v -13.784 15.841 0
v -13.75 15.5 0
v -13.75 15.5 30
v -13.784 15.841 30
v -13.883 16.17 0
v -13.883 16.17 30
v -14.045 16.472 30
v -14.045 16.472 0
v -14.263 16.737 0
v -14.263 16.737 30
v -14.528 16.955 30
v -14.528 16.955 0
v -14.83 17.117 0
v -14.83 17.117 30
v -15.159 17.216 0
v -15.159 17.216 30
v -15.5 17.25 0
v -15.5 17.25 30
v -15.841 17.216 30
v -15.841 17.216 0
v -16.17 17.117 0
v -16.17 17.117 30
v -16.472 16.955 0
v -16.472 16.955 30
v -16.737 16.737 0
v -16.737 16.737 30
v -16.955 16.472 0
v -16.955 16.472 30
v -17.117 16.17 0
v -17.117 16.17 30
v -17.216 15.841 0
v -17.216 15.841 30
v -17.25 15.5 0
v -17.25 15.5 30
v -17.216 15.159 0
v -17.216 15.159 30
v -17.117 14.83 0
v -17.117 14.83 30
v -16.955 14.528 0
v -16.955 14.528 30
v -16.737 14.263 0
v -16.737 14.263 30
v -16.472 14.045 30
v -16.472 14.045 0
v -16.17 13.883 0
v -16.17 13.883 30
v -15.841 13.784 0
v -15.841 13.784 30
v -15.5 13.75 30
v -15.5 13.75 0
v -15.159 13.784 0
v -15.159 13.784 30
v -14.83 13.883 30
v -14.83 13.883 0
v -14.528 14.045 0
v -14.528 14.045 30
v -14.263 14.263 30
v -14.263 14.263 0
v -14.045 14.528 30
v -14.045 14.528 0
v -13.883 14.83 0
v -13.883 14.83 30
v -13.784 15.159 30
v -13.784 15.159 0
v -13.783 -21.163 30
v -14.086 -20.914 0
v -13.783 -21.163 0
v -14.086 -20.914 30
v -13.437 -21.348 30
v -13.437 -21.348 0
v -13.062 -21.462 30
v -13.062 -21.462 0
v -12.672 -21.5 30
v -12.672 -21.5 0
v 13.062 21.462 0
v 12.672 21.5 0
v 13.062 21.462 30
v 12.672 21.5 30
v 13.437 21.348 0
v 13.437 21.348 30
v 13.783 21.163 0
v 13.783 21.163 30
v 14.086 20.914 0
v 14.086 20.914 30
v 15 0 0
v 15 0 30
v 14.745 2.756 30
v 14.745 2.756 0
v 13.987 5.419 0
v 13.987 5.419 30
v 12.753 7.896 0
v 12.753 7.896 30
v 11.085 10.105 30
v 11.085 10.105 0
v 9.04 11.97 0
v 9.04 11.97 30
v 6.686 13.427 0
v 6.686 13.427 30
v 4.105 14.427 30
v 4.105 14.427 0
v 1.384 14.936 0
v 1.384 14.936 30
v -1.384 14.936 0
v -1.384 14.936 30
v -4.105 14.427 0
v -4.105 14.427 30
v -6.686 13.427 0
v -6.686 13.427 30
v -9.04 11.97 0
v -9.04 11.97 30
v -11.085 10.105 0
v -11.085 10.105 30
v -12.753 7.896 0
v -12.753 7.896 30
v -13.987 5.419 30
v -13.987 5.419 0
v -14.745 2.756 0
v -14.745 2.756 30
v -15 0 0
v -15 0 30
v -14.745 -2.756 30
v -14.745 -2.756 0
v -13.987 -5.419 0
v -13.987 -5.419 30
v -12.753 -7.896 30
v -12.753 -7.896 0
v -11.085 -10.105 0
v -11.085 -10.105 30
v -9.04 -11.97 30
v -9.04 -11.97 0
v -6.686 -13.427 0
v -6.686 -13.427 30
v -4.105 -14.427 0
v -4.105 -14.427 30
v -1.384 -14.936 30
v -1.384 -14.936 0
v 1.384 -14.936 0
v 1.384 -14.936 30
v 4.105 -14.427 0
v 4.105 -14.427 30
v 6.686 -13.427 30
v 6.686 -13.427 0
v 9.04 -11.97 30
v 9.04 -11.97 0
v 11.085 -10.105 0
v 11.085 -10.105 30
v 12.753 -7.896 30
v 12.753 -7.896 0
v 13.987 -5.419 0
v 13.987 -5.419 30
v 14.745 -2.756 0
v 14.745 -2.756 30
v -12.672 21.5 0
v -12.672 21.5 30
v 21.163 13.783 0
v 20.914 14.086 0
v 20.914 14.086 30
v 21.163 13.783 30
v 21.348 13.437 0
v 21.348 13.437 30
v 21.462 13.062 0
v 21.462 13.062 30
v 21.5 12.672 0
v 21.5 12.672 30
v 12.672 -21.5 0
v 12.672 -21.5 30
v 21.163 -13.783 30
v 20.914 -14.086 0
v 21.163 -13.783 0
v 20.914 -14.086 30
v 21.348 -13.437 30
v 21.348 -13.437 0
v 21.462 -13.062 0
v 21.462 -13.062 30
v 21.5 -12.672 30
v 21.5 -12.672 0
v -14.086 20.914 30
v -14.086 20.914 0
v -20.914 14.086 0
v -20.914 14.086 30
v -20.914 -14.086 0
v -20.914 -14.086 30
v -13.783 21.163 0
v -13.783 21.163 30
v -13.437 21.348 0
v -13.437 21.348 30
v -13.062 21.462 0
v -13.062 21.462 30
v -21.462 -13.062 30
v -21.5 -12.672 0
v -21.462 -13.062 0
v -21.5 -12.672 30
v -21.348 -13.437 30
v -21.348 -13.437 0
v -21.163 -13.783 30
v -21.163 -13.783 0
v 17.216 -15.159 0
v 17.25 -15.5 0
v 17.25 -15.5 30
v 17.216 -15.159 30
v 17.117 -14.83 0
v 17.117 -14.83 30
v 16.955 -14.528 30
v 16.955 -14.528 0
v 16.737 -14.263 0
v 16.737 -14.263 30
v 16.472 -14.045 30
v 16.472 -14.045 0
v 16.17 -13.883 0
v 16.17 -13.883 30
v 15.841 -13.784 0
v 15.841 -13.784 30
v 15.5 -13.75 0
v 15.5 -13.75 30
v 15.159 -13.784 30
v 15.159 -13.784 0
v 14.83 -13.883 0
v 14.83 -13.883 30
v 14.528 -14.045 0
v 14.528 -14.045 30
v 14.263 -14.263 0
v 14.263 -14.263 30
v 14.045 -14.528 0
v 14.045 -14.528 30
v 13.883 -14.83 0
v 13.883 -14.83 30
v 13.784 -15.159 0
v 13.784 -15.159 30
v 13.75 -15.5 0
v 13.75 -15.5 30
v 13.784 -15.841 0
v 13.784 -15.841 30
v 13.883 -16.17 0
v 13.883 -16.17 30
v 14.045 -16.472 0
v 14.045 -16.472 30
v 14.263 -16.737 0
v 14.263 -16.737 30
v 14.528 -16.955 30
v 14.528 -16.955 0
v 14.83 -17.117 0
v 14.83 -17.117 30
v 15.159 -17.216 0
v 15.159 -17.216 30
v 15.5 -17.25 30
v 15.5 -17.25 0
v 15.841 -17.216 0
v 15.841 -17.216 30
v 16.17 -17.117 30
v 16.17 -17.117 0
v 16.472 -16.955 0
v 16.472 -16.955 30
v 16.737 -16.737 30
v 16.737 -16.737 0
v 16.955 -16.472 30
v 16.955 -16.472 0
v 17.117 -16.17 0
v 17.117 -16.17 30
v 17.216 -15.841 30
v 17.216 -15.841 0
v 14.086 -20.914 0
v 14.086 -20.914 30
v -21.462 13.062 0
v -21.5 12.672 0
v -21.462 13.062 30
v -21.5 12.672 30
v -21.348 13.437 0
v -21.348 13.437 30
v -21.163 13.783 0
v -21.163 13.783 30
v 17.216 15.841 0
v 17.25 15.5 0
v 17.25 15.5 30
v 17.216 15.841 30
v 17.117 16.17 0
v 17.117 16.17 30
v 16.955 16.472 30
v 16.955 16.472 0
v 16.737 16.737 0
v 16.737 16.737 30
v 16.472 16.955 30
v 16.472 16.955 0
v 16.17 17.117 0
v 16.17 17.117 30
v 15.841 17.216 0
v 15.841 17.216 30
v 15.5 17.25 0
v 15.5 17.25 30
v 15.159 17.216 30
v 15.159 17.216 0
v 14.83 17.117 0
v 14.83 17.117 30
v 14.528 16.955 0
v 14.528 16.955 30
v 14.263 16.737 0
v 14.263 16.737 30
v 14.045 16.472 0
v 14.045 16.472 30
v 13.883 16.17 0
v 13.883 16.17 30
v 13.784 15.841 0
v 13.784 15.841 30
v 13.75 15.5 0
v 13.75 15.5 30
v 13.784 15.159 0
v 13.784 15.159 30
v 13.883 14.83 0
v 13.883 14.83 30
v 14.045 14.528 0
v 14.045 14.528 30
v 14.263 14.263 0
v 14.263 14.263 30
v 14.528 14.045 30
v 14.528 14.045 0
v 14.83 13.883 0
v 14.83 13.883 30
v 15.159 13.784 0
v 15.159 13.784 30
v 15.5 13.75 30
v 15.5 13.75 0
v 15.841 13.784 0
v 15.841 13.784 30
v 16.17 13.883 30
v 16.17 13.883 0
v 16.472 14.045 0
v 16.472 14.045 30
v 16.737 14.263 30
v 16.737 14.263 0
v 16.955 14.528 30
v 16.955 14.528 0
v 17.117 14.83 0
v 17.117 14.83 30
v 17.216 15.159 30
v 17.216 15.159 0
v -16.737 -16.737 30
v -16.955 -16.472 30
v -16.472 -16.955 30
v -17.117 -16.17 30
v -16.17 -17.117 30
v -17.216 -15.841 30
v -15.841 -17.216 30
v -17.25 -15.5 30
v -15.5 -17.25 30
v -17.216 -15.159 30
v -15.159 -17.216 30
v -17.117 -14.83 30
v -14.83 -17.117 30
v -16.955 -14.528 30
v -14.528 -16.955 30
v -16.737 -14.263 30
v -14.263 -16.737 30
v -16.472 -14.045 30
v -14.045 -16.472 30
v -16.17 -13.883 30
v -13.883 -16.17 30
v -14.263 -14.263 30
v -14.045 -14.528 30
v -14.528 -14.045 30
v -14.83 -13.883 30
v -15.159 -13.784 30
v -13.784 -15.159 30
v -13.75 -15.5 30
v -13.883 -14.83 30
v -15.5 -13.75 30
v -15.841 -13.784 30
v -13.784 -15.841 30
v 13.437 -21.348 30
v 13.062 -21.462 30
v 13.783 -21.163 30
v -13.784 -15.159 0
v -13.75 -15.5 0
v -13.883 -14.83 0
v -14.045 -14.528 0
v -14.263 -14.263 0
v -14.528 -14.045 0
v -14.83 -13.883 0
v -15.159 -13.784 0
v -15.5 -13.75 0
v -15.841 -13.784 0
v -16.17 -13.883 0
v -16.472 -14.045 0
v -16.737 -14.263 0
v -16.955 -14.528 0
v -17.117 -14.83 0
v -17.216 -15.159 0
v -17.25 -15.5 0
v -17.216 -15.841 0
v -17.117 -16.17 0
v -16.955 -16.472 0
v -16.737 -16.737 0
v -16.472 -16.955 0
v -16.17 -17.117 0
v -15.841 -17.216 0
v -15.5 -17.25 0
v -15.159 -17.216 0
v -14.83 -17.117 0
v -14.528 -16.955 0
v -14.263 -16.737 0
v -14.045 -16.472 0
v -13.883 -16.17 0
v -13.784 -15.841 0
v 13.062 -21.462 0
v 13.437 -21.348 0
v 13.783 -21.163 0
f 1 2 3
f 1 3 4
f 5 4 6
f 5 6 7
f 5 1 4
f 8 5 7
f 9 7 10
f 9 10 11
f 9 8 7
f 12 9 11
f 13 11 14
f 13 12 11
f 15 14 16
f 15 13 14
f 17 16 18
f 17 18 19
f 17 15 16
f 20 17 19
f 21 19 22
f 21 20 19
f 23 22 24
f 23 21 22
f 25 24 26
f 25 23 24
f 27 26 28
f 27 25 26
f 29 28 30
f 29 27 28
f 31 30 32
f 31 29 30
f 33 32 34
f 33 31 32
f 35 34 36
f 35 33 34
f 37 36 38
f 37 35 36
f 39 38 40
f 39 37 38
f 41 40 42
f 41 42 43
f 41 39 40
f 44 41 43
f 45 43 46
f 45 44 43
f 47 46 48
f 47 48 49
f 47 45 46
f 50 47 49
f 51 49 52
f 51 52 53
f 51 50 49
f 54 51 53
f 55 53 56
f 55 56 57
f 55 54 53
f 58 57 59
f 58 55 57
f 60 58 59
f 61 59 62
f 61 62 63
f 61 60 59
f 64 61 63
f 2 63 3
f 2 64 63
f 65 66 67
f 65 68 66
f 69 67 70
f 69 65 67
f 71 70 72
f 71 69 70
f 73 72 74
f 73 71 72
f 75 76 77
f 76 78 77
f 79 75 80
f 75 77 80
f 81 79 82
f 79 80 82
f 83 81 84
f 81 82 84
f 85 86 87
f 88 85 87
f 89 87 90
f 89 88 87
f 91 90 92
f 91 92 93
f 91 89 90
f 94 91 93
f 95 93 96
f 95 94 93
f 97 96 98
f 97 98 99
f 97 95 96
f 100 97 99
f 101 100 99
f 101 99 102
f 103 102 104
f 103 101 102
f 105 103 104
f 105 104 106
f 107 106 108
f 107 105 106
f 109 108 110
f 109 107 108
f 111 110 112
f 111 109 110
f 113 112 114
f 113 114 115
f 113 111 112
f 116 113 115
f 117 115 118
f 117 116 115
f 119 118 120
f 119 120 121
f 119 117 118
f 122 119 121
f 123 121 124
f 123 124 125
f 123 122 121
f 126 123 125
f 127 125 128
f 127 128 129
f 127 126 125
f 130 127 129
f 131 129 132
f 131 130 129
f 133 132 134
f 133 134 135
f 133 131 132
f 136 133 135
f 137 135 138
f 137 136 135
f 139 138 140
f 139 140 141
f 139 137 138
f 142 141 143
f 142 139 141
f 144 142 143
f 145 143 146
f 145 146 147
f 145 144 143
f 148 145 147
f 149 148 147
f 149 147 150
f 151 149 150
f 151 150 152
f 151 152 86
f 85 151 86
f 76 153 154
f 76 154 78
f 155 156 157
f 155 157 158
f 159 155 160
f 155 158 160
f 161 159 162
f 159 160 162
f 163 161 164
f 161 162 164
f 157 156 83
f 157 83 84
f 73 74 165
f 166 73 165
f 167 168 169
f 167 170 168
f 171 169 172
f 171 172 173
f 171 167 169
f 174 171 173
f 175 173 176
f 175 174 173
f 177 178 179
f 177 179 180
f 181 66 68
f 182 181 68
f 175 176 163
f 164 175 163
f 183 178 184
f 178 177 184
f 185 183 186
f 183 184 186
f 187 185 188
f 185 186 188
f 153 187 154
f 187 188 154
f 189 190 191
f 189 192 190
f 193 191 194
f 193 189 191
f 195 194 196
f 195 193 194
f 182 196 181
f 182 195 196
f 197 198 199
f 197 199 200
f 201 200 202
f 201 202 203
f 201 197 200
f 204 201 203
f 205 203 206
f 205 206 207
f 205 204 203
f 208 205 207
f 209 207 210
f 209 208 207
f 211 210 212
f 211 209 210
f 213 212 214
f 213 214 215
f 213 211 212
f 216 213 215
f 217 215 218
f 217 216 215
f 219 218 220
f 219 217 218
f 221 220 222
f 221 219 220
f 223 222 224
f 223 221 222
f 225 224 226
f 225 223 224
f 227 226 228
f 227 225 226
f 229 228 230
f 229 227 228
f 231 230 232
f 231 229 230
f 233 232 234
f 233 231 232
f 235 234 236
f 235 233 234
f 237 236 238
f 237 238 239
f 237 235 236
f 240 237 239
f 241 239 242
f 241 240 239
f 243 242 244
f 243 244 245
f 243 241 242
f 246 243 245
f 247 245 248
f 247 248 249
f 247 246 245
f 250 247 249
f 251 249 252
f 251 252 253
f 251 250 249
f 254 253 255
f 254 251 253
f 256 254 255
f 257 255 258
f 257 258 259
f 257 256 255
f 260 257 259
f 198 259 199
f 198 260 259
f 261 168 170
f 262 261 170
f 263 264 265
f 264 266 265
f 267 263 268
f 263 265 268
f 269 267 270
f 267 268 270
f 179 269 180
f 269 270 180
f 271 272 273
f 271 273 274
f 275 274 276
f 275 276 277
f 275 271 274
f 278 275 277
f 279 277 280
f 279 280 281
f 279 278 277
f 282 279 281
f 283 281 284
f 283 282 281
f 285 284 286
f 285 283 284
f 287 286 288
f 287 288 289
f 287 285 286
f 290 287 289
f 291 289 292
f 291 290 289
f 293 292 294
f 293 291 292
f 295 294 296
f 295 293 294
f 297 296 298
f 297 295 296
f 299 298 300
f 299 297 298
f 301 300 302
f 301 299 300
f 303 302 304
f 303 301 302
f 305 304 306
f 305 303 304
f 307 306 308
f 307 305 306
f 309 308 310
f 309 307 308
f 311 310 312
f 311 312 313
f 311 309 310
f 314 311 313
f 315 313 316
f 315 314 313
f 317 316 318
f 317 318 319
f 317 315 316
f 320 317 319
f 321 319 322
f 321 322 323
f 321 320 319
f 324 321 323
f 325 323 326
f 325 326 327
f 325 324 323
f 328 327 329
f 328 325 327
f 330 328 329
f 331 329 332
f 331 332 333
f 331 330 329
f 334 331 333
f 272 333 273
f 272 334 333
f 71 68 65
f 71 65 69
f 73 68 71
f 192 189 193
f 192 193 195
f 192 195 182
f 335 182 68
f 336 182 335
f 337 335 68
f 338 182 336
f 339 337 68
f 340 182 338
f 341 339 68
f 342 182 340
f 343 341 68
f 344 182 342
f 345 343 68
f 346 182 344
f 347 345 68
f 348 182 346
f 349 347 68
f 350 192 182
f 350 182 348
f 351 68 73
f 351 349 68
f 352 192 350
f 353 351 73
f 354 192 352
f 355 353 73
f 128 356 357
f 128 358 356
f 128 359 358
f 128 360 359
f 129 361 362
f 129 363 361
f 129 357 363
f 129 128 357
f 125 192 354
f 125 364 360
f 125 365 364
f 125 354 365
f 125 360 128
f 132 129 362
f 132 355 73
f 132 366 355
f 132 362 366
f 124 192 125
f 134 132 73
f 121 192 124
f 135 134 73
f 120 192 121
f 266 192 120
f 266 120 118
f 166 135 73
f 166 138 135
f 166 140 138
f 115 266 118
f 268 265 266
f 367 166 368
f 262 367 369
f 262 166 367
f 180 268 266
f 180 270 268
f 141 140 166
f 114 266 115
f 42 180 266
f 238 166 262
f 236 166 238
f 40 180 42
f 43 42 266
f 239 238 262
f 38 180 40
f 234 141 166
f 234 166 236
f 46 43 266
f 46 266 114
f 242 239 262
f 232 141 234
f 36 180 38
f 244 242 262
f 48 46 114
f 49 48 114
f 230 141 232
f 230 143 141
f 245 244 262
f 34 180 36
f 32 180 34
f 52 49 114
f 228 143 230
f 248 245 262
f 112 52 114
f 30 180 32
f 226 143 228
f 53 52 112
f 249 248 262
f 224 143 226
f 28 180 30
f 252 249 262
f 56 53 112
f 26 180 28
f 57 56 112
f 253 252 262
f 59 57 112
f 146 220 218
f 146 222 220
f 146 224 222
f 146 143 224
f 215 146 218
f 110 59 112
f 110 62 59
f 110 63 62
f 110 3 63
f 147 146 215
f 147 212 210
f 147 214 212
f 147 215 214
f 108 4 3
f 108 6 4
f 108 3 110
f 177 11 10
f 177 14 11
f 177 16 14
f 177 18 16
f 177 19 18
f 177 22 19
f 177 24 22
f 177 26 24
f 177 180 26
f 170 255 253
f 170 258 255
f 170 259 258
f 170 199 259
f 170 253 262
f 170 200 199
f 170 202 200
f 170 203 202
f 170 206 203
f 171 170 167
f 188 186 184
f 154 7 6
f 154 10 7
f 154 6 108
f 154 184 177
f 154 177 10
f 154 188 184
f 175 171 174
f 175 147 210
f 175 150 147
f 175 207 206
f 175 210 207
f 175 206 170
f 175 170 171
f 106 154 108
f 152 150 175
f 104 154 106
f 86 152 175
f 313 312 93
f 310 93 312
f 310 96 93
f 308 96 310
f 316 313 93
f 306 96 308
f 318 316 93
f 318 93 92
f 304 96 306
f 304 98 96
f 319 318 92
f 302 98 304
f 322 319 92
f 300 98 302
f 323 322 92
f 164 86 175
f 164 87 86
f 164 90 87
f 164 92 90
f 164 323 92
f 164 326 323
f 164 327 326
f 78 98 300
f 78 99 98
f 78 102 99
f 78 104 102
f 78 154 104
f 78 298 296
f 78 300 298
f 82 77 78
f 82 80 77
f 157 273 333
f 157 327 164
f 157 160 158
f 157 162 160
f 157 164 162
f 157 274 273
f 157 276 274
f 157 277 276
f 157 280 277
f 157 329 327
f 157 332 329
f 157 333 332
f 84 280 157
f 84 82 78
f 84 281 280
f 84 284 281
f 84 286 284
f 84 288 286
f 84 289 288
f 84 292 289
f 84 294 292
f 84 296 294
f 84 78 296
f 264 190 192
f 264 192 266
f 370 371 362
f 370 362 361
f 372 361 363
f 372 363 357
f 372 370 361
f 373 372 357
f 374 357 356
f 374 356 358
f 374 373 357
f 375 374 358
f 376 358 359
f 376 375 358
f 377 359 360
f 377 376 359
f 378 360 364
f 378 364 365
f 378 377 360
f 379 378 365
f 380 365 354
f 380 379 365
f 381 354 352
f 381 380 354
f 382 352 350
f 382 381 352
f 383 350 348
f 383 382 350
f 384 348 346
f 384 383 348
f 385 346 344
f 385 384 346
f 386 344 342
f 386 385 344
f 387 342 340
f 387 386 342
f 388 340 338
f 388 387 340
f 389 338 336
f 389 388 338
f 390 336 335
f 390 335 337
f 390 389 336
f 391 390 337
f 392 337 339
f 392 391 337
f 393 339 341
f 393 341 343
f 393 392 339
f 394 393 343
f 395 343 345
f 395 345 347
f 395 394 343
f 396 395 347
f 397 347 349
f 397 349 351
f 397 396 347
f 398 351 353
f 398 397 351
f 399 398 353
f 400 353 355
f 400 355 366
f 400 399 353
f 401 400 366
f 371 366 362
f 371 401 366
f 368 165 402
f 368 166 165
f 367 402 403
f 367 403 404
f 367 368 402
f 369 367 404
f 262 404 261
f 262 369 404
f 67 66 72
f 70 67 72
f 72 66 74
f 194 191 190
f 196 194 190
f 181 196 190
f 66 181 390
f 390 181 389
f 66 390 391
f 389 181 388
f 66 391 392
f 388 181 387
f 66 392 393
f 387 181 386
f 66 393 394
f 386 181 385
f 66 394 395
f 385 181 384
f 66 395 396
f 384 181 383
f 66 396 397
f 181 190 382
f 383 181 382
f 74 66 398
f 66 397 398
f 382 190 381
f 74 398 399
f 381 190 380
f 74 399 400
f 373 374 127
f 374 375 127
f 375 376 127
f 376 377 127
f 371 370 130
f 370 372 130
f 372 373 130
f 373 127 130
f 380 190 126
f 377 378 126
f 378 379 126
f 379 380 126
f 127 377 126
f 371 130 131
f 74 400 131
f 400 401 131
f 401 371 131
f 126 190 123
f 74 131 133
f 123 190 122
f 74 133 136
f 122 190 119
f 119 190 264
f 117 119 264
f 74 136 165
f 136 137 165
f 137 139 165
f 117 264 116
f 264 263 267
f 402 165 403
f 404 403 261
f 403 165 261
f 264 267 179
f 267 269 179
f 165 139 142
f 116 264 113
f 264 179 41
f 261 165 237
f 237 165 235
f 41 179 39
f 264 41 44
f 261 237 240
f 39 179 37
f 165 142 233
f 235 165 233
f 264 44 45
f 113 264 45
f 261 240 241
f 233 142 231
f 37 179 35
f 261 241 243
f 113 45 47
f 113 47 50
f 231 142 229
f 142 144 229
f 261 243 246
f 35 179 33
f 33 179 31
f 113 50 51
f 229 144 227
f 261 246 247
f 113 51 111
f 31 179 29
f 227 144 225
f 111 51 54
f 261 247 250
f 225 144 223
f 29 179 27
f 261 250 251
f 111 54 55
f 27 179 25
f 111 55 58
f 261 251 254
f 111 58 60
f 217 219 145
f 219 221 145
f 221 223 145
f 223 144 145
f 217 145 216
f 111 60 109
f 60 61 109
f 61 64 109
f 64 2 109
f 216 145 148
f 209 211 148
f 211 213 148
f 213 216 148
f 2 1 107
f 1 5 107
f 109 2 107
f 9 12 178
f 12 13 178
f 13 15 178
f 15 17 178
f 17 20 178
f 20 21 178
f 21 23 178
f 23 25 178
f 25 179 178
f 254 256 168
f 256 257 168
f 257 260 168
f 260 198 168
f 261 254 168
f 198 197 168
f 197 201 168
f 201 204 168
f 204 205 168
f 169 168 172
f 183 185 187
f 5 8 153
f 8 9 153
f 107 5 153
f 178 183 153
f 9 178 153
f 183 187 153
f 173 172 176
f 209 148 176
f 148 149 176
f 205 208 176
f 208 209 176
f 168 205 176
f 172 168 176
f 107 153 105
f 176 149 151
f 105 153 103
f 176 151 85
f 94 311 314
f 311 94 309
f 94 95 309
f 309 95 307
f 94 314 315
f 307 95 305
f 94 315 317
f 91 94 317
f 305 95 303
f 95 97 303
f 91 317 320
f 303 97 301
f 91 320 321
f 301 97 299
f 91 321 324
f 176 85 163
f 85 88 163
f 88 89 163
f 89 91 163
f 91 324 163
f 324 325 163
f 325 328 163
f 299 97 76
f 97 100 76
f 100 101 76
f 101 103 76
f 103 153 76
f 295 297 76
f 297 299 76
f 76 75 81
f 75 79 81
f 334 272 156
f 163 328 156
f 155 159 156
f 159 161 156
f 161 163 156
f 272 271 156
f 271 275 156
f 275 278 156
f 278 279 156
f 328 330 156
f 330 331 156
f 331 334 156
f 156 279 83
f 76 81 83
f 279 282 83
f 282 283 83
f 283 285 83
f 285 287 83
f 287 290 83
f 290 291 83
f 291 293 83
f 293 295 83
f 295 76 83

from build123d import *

# Parameters (mm, degrees)
F0_W     = 43
F0_H     = 43
F0_R     = 1.75
F0_R_2   = 15
F1_DEPTH = 30
F2_SIZE  = 8
F3_R     = 2


with BuildPart() as f1:
    # F0 (on Top) → F1 (new body)
    with BuildSketch(Plane.XY):
        Rectangle(F0_W, F0_H)
        with Locations((-15.5, -15.5)):
            Circle(F0_R, mode=Mode.SUBTRACT)
        with Locations((15.5, -15.5)):
            Circle(F0_R, mode=Mode.SUBTRACT)
        with Locations((-15.5, 15.5)):
            Circle(F0_R, mode=Mode.SUBTRACT)
        Circle(F0_R_2, mode=Mode.SUBTRACT)
        with Locations((15.5, 15.5)):
            Circle(F0_R, mode=Mode.SUBTRACT)
    extrude(amount=F1_DEPTH)

    # F2
    f2_edges = [f1.edges().sort_by_distance(p)[0] for p in [
        (-21.5, -21.5, 15),
        (21.5, -21.5, 15),
        (21.5, 21.5, 15),
        (-21.5, 21.5, 15),
    ]]
    chamfer(f2_edges, length=F2_SIZE)

    # F3
    f3_edges = [f1.edges().sort_by_distance(p)[0] for p in [
        (-13.5, 21.5, 15),
        (13.5, 21.5, 15),
        (21.5, 13.5, 15),
        (-21.5, 13.5, 15),
        (21.5, -13.5, 15),
        (13.5, -21.5, 15),
        (-13.5, -21.5, 15),
        (-21.5, -13.5, 15),
    ]]
    fillet(f3_edges, radius=F3_R)


solid = f1.part
